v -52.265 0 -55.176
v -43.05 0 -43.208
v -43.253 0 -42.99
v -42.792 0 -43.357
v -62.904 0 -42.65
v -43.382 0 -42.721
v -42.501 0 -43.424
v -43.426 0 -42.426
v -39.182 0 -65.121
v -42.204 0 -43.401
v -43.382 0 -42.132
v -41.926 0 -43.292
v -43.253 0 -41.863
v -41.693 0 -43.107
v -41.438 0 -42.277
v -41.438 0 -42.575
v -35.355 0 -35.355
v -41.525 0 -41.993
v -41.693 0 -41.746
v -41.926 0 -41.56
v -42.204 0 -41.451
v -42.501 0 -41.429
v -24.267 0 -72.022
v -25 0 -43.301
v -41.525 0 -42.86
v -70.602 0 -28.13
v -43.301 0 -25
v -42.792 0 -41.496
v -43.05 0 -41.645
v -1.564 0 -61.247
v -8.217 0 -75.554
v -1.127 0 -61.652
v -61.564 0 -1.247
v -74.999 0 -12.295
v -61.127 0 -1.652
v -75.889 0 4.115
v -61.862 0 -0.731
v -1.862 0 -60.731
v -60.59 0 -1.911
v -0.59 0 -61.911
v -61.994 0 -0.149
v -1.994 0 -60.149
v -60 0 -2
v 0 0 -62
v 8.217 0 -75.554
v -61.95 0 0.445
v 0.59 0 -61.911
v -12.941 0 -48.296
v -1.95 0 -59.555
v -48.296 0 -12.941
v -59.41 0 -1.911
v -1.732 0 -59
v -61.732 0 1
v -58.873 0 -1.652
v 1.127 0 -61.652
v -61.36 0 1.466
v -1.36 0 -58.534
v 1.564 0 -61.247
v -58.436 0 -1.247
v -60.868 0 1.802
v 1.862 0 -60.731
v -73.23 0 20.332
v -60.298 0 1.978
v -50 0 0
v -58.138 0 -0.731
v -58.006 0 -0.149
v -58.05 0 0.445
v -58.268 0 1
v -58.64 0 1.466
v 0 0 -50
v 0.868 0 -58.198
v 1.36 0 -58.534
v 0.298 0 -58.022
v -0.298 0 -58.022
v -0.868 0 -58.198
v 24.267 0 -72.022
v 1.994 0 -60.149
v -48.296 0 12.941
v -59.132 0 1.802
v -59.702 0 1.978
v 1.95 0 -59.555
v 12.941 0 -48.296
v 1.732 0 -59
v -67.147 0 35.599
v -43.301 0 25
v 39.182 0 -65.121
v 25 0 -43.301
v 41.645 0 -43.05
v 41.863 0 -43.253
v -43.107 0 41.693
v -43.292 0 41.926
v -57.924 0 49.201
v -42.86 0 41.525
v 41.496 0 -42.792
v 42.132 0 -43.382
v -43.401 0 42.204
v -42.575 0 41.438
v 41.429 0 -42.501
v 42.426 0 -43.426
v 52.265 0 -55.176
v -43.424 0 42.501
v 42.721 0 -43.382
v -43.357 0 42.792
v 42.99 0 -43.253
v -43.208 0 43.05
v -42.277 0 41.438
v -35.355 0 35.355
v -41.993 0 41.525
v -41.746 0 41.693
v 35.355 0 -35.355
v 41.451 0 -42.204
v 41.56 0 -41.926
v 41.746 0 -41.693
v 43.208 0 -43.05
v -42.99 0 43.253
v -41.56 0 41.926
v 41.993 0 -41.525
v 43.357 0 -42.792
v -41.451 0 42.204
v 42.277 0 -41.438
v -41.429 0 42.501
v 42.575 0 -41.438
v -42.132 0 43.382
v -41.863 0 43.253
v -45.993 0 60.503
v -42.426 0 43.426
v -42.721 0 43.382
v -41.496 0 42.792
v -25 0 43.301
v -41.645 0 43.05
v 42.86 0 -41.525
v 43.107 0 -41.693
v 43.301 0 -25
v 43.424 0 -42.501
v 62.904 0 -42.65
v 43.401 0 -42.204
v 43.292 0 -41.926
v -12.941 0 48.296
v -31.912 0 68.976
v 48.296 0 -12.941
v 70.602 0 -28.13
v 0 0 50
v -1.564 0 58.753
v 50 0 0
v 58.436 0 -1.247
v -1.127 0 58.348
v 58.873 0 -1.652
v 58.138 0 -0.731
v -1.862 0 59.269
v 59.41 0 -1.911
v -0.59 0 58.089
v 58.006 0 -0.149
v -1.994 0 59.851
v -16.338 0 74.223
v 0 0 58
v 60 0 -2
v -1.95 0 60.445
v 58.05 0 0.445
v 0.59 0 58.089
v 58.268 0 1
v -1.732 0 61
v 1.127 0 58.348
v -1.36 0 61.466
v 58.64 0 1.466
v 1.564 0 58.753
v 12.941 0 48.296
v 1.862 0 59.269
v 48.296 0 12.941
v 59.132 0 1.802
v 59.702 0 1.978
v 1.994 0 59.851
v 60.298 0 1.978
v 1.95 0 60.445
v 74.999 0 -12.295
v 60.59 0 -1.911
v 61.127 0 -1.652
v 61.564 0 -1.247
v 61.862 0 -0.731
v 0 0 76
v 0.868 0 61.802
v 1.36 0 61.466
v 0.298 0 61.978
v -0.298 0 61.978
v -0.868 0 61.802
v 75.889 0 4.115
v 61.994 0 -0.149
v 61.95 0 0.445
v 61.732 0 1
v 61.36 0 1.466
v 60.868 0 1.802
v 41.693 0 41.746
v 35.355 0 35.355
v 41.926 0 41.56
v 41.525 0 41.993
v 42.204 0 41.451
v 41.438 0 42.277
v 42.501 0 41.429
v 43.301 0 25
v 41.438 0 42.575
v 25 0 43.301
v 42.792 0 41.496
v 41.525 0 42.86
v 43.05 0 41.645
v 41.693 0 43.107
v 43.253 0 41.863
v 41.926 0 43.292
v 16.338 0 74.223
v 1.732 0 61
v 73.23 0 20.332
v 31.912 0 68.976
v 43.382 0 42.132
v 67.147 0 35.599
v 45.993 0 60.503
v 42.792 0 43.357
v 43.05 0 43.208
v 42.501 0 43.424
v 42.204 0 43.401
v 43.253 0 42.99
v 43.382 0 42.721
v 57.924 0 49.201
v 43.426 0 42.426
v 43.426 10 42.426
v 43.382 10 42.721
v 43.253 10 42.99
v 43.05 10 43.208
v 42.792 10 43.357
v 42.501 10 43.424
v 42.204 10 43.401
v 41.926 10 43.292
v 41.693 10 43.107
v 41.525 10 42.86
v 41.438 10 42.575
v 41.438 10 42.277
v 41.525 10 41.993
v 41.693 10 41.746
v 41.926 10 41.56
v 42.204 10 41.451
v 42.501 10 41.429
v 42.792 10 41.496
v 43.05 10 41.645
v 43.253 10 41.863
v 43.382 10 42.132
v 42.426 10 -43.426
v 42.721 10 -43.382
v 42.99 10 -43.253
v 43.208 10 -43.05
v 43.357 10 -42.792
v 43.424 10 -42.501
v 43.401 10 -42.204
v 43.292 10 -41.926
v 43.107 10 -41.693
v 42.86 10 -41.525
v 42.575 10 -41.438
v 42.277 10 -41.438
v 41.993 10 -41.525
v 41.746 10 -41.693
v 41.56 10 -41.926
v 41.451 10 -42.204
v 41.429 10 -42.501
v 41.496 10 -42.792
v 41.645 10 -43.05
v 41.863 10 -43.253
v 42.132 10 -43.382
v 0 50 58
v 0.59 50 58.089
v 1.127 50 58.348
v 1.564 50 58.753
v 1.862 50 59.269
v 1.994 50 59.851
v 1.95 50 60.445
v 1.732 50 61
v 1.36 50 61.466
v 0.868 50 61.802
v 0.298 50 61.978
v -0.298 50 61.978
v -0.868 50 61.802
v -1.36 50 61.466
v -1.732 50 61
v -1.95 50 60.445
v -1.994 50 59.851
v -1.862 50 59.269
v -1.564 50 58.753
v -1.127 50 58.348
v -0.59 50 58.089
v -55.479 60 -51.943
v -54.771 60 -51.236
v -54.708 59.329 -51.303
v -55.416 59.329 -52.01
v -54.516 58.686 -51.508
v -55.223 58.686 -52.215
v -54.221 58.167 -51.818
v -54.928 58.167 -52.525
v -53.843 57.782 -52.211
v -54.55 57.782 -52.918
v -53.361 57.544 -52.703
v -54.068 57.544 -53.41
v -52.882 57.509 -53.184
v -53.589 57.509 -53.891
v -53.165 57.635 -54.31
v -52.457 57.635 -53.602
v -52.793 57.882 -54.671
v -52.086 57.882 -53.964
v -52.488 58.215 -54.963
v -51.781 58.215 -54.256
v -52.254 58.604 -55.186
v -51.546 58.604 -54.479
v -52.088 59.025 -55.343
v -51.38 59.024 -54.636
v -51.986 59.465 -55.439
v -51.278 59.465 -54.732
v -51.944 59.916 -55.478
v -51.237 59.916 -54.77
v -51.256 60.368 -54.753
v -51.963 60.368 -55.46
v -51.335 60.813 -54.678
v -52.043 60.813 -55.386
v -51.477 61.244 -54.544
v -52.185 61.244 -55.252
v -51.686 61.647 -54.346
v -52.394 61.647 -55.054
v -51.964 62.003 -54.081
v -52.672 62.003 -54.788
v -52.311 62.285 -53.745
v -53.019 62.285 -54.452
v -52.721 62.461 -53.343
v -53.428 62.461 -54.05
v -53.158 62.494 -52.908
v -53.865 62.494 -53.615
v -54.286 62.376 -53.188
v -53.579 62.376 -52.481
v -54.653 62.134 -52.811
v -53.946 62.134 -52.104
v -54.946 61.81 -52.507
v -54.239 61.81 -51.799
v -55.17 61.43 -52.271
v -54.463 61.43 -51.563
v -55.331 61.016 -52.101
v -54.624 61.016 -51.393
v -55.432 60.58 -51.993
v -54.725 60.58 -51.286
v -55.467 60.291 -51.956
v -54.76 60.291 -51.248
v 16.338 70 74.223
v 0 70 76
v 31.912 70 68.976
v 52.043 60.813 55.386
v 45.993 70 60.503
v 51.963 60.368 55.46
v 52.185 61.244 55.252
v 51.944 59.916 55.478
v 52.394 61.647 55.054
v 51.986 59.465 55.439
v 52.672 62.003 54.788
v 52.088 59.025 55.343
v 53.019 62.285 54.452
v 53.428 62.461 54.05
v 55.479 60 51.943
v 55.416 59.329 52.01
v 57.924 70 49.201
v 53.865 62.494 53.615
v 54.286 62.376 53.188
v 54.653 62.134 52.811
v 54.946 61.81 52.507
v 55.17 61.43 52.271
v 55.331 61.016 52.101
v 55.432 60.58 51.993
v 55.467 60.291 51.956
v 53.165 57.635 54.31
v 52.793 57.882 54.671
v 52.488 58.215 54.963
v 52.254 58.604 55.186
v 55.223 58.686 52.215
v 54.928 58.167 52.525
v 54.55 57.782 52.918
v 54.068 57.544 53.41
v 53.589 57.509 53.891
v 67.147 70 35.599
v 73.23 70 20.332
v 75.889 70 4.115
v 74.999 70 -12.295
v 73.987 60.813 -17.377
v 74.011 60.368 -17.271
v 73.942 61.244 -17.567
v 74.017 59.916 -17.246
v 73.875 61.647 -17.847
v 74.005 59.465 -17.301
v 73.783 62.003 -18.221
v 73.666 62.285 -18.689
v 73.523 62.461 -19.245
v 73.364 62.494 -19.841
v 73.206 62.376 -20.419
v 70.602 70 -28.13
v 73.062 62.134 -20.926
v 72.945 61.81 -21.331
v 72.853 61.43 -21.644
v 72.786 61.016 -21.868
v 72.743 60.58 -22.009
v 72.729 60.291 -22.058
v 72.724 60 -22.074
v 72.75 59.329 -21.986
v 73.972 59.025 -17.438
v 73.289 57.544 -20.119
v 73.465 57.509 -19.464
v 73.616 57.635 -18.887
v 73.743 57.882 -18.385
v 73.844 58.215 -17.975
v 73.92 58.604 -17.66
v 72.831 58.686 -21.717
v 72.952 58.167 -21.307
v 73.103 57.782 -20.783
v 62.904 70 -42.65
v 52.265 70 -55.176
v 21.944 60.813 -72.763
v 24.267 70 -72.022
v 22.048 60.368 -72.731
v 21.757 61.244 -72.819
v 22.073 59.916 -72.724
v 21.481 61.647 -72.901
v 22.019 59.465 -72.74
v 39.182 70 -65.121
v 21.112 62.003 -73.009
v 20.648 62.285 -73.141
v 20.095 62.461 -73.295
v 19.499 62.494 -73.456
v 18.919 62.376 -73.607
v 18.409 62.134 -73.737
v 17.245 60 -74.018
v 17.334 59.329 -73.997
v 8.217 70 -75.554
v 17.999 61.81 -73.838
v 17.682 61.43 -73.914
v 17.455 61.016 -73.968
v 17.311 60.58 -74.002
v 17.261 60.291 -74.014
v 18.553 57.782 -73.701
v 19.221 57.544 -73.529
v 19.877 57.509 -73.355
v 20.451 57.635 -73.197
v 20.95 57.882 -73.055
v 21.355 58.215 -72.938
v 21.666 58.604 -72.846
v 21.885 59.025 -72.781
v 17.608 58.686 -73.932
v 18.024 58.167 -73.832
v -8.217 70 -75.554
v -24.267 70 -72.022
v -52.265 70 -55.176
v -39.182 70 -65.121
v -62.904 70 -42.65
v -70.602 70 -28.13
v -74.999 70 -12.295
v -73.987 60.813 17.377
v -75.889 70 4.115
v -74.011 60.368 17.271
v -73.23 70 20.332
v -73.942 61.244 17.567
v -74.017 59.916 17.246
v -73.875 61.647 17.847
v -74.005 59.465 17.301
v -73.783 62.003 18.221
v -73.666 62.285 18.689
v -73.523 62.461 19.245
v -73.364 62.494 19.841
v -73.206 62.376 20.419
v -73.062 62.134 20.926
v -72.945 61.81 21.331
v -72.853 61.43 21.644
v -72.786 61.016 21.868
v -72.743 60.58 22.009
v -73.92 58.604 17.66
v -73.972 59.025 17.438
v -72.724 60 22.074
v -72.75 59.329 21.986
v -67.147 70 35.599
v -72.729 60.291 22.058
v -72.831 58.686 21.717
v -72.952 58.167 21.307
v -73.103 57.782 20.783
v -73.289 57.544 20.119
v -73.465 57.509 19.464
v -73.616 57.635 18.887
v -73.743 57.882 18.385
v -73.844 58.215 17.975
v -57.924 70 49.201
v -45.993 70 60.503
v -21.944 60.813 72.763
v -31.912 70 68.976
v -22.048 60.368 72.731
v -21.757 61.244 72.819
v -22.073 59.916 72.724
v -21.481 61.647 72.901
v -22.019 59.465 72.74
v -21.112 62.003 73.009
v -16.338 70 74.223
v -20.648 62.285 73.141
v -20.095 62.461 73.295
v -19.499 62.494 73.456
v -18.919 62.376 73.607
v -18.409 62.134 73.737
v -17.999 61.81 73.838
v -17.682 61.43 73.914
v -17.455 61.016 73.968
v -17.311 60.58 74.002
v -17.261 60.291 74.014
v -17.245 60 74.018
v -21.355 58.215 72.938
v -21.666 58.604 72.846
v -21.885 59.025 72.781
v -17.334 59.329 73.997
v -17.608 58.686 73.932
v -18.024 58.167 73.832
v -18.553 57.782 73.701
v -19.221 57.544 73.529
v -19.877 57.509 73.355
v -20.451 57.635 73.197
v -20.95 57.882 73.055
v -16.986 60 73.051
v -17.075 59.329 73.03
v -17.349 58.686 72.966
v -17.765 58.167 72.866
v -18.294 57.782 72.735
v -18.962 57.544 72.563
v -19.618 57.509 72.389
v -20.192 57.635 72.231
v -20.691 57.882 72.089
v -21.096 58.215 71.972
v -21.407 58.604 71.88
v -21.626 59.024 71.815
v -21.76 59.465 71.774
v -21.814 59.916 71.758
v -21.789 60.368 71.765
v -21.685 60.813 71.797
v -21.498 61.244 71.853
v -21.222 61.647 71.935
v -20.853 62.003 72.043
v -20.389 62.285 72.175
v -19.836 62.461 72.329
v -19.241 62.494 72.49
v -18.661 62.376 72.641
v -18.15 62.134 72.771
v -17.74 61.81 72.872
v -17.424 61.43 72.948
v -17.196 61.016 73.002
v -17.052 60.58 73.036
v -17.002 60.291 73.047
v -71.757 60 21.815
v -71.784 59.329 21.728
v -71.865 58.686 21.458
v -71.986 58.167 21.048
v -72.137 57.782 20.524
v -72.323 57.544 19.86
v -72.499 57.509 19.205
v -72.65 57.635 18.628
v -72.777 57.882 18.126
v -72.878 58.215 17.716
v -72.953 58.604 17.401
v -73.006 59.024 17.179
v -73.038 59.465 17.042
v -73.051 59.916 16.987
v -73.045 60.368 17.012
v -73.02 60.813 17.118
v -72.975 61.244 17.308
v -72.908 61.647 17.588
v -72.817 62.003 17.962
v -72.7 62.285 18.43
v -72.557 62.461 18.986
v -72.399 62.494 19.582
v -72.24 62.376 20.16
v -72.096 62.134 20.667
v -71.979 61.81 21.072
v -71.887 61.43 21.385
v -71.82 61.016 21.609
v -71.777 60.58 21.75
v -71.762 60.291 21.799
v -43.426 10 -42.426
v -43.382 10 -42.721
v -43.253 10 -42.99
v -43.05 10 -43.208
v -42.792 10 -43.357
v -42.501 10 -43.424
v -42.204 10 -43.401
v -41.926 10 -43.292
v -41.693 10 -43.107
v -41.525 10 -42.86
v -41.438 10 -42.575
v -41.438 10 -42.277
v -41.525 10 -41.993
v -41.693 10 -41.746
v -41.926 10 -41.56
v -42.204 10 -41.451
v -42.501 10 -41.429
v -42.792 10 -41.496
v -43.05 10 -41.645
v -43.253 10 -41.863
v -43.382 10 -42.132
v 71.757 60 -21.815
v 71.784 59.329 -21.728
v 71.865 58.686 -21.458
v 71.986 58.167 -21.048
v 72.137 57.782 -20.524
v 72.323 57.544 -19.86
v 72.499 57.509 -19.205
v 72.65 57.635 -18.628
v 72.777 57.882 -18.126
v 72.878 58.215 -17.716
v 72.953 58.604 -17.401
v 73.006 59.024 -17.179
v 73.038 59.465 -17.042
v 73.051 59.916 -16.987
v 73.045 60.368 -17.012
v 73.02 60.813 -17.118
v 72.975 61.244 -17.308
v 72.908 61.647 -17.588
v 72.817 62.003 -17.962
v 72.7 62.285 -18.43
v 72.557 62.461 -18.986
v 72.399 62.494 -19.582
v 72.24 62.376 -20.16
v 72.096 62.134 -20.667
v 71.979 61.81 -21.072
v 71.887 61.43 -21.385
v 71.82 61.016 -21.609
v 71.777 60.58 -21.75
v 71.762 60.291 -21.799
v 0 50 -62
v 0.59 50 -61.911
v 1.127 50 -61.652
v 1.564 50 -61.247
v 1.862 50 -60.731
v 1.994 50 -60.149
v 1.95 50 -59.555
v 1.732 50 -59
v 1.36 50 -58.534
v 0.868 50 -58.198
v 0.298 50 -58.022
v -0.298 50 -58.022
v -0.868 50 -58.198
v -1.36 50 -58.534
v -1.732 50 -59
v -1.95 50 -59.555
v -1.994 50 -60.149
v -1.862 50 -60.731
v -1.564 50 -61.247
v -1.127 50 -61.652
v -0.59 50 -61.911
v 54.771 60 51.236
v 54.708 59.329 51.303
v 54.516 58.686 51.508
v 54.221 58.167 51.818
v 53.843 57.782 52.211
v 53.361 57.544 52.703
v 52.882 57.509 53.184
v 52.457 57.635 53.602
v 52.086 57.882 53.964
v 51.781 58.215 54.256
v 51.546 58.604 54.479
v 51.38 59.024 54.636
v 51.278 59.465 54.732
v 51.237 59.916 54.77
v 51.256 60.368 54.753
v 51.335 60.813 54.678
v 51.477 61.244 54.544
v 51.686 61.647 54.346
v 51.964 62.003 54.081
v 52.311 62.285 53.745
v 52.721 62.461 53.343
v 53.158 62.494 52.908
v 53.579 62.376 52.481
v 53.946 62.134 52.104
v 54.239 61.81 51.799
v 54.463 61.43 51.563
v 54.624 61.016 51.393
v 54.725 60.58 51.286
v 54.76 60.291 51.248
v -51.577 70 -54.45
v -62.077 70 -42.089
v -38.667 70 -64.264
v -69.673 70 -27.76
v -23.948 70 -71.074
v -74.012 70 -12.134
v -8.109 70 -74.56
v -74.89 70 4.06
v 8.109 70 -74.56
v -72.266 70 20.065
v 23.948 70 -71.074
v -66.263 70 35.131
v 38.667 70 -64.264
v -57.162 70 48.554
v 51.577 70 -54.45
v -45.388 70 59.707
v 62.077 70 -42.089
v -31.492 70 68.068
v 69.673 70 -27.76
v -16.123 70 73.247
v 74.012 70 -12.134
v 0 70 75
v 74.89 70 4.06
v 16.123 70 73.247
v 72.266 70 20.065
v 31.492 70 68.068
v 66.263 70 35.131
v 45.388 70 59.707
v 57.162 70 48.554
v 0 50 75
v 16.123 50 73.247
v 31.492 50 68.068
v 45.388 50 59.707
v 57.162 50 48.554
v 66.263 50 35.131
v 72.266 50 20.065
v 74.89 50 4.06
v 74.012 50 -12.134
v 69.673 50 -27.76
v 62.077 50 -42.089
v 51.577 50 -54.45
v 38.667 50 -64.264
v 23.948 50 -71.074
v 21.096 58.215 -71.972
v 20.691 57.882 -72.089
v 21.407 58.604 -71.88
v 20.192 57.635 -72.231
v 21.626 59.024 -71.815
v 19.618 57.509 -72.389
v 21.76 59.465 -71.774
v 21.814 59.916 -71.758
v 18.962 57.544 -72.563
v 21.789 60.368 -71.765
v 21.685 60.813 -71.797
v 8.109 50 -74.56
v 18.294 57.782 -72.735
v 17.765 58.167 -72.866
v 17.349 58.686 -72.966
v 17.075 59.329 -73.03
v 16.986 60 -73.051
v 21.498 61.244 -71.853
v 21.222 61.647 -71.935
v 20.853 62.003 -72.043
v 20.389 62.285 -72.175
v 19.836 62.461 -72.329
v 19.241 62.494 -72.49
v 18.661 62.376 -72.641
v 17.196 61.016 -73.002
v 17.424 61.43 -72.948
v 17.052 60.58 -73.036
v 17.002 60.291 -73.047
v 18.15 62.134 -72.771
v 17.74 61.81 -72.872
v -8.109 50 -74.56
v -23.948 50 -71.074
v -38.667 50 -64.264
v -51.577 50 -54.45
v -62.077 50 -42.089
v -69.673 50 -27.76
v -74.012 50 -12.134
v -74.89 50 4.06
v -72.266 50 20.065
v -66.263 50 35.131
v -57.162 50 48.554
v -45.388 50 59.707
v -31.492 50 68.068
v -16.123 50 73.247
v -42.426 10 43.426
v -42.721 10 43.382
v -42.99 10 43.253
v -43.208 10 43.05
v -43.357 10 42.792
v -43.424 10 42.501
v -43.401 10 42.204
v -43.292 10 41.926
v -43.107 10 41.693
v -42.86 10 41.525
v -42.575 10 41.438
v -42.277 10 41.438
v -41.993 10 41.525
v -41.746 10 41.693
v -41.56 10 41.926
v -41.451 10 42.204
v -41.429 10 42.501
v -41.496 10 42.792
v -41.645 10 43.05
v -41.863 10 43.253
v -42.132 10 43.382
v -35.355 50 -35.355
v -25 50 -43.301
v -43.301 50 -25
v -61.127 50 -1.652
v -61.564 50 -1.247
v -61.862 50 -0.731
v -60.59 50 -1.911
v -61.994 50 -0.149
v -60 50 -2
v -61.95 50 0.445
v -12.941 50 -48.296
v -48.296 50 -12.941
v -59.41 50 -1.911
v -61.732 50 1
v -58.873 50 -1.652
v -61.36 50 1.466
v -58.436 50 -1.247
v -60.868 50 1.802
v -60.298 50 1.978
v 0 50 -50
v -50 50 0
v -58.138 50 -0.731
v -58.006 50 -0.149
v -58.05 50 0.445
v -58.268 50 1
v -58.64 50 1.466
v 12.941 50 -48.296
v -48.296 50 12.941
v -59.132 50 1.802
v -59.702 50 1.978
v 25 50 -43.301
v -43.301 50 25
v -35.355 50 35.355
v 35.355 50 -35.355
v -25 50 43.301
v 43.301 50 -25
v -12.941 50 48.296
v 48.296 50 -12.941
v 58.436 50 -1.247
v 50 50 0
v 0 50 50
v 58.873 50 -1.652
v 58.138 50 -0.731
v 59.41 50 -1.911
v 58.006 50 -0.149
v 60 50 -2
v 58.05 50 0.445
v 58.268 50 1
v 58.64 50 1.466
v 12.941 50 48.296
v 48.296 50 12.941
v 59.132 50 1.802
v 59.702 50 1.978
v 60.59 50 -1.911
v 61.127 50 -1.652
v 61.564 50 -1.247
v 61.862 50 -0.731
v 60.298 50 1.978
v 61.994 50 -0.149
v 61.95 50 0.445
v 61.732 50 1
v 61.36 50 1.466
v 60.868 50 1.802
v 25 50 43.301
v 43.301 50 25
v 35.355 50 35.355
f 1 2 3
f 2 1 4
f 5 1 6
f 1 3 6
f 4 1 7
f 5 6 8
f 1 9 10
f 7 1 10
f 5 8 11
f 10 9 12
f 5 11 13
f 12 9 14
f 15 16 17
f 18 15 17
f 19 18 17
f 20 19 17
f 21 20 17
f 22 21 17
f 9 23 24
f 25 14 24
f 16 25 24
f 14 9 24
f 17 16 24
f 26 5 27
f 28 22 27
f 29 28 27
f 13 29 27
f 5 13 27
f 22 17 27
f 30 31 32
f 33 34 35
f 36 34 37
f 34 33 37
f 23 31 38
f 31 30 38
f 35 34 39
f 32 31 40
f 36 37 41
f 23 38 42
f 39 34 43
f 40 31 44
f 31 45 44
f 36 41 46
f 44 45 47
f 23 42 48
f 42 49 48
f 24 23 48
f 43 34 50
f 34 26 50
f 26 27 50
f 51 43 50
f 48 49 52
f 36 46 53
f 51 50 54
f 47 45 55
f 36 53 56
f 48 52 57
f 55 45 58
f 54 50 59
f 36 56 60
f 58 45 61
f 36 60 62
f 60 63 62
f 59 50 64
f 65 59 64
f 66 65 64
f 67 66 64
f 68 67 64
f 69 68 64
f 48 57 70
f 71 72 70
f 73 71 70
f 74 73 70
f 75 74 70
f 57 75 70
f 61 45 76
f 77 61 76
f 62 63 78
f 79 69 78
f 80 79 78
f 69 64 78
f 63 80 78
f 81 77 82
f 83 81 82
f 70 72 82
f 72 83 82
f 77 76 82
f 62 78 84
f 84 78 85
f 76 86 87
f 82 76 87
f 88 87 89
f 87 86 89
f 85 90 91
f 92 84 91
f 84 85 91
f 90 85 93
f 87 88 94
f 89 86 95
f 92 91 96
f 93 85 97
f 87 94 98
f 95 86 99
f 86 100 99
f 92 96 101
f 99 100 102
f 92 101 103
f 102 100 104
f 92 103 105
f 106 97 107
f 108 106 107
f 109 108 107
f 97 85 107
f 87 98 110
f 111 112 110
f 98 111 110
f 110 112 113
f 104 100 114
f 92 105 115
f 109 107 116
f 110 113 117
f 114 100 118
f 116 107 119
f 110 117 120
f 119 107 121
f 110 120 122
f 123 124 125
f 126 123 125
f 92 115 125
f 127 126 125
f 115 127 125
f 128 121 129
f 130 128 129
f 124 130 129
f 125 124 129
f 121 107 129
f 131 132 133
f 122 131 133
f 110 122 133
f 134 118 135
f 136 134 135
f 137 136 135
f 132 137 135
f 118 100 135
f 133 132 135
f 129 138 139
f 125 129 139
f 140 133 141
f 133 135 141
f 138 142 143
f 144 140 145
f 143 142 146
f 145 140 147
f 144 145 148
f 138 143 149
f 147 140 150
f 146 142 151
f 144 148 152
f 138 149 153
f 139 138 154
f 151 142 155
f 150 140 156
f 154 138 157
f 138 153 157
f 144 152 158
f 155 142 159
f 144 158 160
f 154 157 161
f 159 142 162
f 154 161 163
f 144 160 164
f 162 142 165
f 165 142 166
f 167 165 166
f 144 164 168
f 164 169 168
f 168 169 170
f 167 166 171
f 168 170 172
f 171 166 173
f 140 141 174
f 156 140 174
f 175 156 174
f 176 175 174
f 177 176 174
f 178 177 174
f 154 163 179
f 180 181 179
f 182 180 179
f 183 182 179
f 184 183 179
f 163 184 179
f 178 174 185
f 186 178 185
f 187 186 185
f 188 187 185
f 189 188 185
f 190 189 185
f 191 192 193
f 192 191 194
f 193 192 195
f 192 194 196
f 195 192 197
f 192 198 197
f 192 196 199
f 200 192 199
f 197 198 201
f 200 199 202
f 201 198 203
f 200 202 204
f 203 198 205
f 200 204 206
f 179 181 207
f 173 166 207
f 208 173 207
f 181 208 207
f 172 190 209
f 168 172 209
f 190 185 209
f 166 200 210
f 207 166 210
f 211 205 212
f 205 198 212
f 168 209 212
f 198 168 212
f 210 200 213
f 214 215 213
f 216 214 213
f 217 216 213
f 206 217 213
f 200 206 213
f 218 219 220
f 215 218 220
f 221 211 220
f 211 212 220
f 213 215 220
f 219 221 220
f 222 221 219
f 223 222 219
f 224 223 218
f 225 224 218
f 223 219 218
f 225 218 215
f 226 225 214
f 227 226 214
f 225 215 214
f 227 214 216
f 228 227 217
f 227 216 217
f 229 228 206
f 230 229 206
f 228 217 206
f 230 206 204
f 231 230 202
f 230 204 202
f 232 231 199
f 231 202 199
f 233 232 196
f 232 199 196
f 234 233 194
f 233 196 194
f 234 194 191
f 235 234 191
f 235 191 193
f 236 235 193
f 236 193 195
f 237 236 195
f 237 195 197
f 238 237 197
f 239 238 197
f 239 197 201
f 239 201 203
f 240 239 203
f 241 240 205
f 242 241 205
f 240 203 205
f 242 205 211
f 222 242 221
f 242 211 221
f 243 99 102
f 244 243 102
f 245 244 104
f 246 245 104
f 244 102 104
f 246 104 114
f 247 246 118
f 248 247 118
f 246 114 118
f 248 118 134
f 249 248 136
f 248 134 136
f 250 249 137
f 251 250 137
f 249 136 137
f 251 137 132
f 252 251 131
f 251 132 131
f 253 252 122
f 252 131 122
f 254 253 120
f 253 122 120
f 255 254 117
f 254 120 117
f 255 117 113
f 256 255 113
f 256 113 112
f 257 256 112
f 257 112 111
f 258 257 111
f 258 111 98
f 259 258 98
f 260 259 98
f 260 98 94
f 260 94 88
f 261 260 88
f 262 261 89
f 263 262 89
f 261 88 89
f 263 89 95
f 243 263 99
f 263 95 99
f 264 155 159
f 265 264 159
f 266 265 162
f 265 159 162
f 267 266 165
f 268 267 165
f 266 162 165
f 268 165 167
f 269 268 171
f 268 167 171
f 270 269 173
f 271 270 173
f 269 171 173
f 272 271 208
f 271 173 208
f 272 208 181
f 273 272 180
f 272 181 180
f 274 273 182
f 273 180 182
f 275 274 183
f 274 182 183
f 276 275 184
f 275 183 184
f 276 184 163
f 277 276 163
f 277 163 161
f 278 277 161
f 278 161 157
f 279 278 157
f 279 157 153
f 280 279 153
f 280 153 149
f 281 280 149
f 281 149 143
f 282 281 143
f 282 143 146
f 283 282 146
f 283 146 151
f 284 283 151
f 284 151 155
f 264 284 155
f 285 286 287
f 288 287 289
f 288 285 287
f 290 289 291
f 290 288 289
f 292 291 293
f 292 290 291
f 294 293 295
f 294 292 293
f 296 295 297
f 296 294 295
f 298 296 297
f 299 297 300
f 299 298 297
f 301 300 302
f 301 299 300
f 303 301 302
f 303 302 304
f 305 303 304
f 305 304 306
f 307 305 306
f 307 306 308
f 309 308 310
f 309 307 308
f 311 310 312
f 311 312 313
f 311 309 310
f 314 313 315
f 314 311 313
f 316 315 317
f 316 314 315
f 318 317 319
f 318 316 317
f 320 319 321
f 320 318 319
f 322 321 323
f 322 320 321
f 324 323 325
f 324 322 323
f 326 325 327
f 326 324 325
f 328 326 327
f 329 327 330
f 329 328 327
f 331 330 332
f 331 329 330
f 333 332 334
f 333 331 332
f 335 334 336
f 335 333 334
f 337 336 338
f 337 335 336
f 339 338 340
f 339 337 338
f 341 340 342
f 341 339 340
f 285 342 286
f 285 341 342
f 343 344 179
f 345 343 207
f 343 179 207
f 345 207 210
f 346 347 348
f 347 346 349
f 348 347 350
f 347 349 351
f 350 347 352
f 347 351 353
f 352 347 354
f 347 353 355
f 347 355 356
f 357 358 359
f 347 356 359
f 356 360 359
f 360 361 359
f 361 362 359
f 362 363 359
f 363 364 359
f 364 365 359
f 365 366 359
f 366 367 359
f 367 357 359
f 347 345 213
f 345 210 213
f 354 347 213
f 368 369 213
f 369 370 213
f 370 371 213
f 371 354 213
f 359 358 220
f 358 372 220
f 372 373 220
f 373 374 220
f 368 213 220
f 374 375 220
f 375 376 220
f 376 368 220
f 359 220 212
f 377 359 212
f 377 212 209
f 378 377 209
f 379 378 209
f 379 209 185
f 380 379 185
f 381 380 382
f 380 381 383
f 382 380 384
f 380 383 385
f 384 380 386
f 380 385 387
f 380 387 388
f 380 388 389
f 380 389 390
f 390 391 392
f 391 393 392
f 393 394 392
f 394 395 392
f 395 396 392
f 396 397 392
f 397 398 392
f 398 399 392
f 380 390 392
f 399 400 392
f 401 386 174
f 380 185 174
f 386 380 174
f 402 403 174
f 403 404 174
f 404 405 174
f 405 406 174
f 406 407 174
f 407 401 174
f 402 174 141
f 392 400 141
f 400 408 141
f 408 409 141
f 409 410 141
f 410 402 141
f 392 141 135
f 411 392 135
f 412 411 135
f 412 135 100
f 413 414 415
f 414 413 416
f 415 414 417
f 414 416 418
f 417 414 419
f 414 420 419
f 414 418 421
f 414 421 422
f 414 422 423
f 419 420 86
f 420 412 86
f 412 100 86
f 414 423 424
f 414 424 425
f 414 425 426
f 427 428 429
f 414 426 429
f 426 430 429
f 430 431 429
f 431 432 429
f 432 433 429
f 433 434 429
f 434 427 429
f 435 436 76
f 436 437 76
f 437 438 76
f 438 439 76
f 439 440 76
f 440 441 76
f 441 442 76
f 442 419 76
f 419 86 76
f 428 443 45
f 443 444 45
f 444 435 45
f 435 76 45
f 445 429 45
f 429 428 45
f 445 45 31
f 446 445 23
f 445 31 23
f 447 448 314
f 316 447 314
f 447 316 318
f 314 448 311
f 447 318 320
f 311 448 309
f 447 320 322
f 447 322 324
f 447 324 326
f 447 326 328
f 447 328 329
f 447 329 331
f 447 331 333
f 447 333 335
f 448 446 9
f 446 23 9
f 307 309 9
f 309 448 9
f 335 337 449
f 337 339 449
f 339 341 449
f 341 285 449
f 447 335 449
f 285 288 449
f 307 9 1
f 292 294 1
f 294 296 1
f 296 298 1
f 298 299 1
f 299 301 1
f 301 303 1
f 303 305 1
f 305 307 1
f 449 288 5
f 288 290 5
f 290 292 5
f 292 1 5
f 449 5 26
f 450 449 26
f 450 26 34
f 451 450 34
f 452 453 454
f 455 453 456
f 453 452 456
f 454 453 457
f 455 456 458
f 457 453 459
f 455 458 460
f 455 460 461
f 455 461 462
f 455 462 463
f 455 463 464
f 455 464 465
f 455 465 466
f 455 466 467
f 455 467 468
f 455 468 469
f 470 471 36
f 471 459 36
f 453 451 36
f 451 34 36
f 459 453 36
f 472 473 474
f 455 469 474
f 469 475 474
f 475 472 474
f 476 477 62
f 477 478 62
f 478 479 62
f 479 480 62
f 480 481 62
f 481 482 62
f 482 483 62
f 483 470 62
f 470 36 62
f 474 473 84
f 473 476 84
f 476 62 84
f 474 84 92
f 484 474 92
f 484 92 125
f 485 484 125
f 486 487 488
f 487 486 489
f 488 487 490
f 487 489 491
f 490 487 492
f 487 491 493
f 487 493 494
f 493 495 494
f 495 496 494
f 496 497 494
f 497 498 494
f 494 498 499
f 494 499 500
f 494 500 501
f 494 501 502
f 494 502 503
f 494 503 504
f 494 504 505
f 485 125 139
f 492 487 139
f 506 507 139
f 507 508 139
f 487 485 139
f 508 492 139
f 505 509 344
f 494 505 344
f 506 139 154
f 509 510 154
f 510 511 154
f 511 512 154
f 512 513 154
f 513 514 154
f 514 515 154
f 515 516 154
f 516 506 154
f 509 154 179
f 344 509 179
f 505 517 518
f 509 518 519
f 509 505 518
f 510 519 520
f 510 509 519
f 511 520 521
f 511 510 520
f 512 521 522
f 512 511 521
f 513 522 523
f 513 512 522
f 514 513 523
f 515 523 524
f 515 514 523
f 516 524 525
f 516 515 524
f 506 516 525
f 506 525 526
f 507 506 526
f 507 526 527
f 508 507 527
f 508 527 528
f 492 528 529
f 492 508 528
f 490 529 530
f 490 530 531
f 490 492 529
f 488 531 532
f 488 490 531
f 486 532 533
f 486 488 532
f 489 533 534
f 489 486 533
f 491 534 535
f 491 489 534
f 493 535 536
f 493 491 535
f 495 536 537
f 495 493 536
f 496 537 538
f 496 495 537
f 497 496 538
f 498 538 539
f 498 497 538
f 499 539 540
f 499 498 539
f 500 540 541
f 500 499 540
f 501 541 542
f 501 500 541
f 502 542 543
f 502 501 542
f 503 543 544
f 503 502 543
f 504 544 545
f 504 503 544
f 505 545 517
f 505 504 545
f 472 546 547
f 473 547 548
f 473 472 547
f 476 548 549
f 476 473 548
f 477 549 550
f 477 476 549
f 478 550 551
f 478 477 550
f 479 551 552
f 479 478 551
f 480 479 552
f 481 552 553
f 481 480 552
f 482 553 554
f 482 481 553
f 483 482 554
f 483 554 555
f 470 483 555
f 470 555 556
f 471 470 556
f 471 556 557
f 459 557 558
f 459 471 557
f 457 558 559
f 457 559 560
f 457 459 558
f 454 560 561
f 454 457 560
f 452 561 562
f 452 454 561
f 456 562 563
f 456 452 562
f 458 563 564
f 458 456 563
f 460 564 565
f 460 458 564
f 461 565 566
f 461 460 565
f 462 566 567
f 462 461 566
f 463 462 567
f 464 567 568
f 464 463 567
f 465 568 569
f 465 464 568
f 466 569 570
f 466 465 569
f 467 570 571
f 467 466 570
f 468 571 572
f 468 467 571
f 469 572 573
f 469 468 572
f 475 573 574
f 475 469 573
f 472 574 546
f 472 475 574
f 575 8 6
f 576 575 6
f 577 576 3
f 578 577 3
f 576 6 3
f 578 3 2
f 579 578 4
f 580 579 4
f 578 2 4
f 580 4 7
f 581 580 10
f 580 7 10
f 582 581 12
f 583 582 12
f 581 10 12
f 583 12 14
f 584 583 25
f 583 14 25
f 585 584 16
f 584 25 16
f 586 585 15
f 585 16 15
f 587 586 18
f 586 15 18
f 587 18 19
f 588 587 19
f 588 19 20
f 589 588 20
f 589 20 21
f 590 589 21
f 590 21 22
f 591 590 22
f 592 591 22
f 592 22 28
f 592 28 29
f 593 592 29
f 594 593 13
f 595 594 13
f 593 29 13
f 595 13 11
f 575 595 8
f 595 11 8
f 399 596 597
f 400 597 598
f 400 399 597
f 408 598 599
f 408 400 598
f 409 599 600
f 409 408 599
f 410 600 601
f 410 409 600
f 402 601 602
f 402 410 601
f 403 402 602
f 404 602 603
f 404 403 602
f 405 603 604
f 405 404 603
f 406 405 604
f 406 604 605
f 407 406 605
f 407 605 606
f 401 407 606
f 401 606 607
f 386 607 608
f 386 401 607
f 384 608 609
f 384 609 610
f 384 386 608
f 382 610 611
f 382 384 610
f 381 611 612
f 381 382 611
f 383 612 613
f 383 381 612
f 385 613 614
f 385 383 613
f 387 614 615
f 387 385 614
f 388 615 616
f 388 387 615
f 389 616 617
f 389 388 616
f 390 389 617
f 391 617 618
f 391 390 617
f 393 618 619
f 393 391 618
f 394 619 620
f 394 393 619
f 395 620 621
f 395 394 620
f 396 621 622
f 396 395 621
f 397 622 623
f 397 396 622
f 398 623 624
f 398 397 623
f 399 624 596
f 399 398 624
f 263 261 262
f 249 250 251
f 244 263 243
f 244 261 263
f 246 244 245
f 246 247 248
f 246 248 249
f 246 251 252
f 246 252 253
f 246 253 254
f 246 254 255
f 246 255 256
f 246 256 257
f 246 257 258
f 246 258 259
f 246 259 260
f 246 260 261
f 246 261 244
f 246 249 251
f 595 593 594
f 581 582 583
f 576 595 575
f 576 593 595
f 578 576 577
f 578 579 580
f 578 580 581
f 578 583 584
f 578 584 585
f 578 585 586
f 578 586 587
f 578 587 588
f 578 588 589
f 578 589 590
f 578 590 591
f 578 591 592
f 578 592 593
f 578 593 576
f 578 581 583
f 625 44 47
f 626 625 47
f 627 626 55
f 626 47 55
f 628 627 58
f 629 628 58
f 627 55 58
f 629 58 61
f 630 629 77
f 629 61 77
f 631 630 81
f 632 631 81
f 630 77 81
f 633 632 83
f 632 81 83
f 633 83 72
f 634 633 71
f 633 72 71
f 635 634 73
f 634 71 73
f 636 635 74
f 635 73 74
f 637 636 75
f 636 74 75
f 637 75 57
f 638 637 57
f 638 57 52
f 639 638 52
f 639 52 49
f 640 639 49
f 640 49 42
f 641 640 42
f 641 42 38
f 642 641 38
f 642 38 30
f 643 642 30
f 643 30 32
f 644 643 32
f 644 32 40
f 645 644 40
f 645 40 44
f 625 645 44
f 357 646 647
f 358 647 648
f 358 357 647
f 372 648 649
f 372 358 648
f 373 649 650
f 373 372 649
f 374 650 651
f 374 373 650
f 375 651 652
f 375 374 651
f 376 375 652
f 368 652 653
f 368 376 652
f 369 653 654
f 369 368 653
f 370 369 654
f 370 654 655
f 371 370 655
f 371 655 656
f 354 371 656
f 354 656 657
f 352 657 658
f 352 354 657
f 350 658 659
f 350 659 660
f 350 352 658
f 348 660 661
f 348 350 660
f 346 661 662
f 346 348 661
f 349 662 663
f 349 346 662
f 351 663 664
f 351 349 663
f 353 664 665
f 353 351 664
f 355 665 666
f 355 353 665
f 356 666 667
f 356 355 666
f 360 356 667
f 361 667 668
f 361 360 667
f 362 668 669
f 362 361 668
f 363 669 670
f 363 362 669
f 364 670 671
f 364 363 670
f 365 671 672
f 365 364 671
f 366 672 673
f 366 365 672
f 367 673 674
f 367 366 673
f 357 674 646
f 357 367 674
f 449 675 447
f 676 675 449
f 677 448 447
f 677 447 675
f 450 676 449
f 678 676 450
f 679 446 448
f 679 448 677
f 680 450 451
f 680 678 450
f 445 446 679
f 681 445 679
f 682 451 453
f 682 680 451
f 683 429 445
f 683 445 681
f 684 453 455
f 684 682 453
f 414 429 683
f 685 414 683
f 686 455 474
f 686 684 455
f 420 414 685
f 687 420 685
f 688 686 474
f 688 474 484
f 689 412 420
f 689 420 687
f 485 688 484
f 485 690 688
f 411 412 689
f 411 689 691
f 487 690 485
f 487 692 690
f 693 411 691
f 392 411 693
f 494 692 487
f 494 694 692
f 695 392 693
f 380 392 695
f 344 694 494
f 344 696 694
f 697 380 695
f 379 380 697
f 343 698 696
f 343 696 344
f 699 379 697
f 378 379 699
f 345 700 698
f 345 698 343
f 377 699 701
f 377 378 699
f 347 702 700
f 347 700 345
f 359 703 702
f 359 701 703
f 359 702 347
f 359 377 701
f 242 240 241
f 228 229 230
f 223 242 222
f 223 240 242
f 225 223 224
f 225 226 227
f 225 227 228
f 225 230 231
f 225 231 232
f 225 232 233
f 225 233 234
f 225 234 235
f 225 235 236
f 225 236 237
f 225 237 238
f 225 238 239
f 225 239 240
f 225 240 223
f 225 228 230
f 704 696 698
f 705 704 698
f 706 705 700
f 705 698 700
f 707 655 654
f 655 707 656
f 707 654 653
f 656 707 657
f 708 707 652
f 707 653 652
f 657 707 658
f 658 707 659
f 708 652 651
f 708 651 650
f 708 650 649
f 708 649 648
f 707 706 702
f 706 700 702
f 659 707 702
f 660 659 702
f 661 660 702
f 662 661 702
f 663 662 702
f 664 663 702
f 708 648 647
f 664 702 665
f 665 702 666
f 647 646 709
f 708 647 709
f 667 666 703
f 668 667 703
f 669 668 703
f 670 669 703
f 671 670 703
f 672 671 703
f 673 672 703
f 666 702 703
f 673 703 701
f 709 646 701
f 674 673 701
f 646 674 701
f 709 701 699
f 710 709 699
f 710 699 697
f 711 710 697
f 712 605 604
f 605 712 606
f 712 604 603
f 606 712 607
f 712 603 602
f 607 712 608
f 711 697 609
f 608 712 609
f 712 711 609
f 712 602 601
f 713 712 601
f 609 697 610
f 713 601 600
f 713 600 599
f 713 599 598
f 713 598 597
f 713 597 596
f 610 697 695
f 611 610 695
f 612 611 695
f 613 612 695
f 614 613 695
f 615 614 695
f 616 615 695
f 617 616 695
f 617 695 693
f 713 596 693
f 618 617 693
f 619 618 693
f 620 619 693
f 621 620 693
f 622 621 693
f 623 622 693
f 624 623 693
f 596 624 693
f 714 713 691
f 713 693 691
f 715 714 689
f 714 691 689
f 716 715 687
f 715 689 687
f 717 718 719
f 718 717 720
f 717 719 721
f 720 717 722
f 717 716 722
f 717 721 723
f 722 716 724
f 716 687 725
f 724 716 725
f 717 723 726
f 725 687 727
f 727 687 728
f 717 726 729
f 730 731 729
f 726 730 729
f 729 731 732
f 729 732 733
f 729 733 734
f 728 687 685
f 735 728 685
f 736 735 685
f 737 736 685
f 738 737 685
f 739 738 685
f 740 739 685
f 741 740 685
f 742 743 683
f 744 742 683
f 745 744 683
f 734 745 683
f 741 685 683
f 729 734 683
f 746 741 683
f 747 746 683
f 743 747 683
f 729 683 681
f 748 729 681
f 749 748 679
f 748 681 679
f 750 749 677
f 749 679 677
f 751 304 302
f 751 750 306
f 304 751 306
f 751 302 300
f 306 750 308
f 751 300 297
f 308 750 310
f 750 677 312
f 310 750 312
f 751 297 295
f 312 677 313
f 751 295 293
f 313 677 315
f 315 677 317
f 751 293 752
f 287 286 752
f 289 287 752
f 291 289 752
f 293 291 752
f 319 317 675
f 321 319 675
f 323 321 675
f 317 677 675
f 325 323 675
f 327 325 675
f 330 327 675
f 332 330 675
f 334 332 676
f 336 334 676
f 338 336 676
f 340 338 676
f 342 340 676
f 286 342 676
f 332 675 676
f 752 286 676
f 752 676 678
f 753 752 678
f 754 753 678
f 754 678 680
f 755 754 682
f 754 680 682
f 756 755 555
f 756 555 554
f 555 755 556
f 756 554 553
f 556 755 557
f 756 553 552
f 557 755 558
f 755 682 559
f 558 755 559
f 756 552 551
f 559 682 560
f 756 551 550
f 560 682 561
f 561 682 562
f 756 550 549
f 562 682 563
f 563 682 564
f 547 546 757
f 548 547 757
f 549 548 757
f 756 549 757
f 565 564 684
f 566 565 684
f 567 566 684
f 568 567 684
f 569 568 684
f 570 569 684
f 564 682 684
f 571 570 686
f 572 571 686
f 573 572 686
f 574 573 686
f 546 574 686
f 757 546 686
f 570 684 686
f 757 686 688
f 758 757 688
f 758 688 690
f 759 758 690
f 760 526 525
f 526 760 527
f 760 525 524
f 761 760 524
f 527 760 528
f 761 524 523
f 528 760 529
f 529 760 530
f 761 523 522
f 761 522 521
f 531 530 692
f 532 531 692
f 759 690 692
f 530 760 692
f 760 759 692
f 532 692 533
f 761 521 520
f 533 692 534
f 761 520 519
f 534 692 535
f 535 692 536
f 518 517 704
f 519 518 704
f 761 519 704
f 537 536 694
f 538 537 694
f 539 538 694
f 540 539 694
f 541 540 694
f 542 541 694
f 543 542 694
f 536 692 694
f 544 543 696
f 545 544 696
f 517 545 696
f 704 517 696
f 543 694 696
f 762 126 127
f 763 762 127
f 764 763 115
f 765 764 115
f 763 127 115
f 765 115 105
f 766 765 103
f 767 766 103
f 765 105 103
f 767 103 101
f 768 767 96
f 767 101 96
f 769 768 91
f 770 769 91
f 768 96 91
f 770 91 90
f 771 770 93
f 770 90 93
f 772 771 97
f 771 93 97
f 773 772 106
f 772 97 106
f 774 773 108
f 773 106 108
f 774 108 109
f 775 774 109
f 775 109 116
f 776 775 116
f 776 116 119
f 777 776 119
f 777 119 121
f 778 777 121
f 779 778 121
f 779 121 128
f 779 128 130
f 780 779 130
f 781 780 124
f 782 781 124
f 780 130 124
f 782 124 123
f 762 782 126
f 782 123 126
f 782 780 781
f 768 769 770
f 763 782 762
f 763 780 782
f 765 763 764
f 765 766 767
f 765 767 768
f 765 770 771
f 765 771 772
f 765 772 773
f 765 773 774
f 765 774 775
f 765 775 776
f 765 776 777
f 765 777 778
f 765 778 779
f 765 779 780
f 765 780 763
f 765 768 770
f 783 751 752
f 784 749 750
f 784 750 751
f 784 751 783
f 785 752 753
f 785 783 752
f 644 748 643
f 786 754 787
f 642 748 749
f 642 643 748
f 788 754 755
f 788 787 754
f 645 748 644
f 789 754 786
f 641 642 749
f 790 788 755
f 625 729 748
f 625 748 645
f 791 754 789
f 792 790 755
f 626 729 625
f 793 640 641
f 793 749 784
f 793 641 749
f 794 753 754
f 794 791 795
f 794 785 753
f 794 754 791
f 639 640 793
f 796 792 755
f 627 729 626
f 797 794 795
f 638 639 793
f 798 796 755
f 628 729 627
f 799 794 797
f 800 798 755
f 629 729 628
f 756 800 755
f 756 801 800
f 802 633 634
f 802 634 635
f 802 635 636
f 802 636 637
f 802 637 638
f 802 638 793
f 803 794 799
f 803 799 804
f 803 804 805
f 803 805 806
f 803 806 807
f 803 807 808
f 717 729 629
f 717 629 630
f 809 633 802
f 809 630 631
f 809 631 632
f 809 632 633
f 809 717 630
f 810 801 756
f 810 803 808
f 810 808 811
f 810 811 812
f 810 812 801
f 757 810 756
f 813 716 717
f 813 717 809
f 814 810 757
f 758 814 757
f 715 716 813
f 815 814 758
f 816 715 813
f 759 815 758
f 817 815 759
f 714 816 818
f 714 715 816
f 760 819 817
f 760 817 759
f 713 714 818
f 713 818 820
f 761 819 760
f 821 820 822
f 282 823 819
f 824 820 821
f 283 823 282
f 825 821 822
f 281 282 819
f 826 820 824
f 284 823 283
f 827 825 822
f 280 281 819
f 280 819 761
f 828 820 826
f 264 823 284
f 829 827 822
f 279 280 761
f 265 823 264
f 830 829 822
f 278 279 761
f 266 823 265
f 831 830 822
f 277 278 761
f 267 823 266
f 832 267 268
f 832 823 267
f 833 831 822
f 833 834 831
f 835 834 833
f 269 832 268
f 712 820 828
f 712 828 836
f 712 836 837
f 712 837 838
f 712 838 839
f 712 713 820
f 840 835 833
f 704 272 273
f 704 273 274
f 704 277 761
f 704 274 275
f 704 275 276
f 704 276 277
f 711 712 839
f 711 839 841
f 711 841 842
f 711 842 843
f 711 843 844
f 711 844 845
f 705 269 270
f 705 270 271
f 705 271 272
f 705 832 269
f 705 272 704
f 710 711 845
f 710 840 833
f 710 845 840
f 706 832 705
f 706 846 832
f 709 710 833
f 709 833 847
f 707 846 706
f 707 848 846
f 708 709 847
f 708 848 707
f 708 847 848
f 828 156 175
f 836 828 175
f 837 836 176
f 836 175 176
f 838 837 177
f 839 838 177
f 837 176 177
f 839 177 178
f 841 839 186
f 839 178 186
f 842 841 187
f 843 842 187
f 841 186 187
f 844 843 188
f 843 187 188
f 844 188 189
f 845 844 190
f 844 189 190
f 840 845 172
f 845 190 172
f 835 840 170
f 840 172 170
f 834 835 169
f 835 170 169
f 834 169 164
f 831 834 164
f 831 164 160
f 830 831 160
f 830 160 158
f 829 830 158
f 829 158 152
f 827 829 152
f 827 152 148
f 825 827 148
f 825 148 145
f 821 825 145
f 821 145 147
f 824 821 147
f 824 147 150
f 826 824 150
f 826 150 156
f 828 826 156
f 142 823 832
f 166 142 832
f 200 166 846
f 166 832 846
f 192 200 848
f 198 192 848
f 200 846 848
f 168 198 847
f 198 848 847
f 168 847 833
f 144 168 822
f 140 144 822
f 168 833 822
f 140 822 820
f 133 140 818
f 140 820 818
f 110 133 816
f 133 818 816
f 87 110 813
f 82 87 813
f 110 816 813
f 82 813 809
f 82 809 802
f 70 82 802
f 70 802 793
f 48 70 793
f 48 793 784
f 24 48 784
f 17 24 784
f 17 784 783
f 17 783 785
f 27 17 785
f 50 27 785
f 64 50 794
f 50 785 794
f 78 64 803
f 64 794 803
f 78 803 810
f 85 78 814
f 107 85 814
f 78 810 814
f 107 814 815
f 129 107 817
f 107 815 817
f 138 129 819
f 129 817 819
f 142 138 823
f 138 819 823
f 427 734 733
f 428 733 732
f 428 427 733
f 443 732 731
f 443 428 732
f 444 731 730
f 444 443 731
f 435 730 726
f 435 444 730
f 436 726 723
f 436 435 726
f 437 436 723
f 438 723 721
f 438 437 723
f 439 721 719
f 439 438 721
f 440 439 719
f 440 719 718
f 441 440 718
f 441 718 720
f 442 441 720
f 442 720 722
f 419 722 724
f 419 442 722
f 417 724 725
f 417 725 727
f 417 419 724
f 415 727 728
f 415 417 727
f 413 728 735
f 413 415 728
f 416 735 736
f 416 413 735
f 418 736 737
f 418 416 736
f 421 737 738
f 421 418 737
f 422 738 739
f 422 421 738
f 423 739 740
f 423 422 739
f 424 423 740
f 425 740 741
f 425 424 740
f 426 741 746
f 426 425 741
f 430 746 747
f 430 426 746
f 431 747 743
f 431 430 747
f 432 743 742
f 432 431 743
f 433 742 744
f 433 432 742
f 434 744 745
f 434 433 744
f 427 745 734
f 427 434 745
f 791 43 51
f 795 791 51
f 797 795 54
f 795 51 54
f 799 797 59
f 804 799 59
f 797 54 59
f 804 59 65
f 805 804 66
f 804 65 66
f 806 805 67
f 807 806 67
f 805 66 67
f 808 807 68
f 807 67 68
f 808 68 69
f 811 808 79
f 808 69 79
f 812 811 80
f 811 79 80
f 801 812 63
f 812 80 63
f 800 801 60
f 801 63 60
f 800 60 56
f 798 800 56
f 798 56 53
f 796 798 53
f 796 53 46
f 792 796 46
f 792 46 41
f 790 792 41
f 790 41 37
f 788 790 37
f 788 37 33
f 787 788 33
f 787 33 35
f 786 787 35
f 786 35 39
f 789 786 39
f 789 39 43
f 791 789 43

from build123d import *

# Parameters (mm, degrees)
SKETCH_1_R               = 76
EXTRUDE_1_DEPTH          = 70
SKETCH_2_R               = 75
CUT_EXTRUDE_1_DEPTH      = 20
SKETCH_3_R               = 50
CUT_EXTRUDE_3_DEPTH      = 50
SKETCH_4_R               = 2
CUT_EXTRUDE_6_DEPTH      = 70
SKETCH_5_R               = 1
CUT_EXTRUDE_7_DEPTH      = 10
PATTERN_CIRCULAR_1_COUNT = 4
PATTERN_CIRCULAR_2_COUNT = 6


with BuildPart() as part:
    # 草圖1 → 填料-伸長1 (new body)
    with BuildSketch(Plane(origin=(0, 0, 0), x_dir=(1, 0, 0), z_dir=(0, 1, 0))):
        with Locations(Location((0, 0, 0), (0, 0, 270))):
            Circle(SKETCH_1_R)
    extrude(amount=EXTRUDE_1_DEPTH)

    # 草圖2 → 除料-伸長1 (cut)
    with BuildSketch(Plane(origin=(0, 70, 0), x_dir=(1, 0, 0), z_dir=(0, 1, 0))):
        with Locations(Location((0, 0, 0), (0, 0, 270))):
            Circle(SKETCH_2_R)
    extrude(amount=-CUT_EXTRUDE_1_DEPTH, mode=Mode.SUBTRACT)

    # 草圖3 → 除料-伸長3 (cut)
    with BuildSketch(Plane(origin=(0, 50, 0), x_dir=(1, 0, 0), z_dir=(0, 1, 0))):
        with Locations(Location((0, 0, 0), (0, 0, 270))):
            Circle(SKETCH_3_R)
    extrude(amount=-CUT_EXTRUDE_3_DEPTH, mode=Mode.SUBTRACT)

    # 草圖4 → 除料-伸長6 (cut)
    with BuildSketch(Plane.XZ):
        with Locations(Location((-60, 0, 0), (0, 0, 270))):
            Circle(SKETCH_4_R)
        with Locations(Location((0, 60, 0), (0, 0, 270))):
            Circle(SKETCH_4_R)
        with Locations(Location((60, 0, 0), (0, 0, 270))):
            Circle(SKETCH_4_R)
        with Locations(Location((0, -60, 0), (0, 0, 270))):
            Circle(SKETCH_4_R)
    extrude(amount=-CUT_EXTRUDE_6_DEPTH, mode=Mode.SUBTRACT)

    # 草圖5 → 除料-伸長7 (cut)
    with BuildSketch(Plane(origin=(0, 0, 0), x_dir=(-1, 0, 0), z_dir=(0, -1, 0))):
        with Locations(Location((-42.426406871, 42.426406871, 0), (0, 0, 90))):
            Circle(SKETCH_5_R)
    cut_extrude_7 = extrude(amount=-CUT_EXTRUDE_7_DEPTH, mode=Mode.SUBTRACT)

    # 環狀複製排列1: 除料-伸長7 ×4 about axis
    pattern_circular_1_axis = Axis((0, 0, 0), (0, 1, 0))
    for i in range(1, PATTERN_CIRCULAR_1_COUNT):
        add(cut_extrude_7.rotate(pattern_circular_1_axis, i * 360 / PATTERN_CIRCULAR_1_COUNT), mode=Mode.SUBTRACT)

    # 草圖7 → M6  螺絲攻的螺孔鑽1 (revolve, cut)
    with BuildSketch(Plane(origin=(53.740115, 60, 53.74011574), x_dir=(0.7071067860573056, 0, -0.7071067763157894), z_dir=(0, 1, 0))):
        Polygon((0, 0), (0, 36.502151548), (2.5, 35), (2.5, 0), align=None)
    hole_wizard_m6_1 = revolve(axis=Axis((58.23024303, 60, 58.230243832), (-0.7071067763157894, 0, -0.7071067860573056)), mode=Mode.SUBTRACT)

    # 環狀複製排列2: M6  螺絲攻的螺孔鑽1 ×6 about axis
    pattern_circular_2_axis = Axis((0, 70, 0), (0, 1, 0))
    for i in range(1, PATTERN_CIRCULAR_2_COUNT):
        add(hole_wizard_m6_1.rotate(pattern_circular_2_axis, i * 360 / PATTERN_CIRCULAR_2_COUNT), mode=Mode.SUBTRACT)


solid = part.part
